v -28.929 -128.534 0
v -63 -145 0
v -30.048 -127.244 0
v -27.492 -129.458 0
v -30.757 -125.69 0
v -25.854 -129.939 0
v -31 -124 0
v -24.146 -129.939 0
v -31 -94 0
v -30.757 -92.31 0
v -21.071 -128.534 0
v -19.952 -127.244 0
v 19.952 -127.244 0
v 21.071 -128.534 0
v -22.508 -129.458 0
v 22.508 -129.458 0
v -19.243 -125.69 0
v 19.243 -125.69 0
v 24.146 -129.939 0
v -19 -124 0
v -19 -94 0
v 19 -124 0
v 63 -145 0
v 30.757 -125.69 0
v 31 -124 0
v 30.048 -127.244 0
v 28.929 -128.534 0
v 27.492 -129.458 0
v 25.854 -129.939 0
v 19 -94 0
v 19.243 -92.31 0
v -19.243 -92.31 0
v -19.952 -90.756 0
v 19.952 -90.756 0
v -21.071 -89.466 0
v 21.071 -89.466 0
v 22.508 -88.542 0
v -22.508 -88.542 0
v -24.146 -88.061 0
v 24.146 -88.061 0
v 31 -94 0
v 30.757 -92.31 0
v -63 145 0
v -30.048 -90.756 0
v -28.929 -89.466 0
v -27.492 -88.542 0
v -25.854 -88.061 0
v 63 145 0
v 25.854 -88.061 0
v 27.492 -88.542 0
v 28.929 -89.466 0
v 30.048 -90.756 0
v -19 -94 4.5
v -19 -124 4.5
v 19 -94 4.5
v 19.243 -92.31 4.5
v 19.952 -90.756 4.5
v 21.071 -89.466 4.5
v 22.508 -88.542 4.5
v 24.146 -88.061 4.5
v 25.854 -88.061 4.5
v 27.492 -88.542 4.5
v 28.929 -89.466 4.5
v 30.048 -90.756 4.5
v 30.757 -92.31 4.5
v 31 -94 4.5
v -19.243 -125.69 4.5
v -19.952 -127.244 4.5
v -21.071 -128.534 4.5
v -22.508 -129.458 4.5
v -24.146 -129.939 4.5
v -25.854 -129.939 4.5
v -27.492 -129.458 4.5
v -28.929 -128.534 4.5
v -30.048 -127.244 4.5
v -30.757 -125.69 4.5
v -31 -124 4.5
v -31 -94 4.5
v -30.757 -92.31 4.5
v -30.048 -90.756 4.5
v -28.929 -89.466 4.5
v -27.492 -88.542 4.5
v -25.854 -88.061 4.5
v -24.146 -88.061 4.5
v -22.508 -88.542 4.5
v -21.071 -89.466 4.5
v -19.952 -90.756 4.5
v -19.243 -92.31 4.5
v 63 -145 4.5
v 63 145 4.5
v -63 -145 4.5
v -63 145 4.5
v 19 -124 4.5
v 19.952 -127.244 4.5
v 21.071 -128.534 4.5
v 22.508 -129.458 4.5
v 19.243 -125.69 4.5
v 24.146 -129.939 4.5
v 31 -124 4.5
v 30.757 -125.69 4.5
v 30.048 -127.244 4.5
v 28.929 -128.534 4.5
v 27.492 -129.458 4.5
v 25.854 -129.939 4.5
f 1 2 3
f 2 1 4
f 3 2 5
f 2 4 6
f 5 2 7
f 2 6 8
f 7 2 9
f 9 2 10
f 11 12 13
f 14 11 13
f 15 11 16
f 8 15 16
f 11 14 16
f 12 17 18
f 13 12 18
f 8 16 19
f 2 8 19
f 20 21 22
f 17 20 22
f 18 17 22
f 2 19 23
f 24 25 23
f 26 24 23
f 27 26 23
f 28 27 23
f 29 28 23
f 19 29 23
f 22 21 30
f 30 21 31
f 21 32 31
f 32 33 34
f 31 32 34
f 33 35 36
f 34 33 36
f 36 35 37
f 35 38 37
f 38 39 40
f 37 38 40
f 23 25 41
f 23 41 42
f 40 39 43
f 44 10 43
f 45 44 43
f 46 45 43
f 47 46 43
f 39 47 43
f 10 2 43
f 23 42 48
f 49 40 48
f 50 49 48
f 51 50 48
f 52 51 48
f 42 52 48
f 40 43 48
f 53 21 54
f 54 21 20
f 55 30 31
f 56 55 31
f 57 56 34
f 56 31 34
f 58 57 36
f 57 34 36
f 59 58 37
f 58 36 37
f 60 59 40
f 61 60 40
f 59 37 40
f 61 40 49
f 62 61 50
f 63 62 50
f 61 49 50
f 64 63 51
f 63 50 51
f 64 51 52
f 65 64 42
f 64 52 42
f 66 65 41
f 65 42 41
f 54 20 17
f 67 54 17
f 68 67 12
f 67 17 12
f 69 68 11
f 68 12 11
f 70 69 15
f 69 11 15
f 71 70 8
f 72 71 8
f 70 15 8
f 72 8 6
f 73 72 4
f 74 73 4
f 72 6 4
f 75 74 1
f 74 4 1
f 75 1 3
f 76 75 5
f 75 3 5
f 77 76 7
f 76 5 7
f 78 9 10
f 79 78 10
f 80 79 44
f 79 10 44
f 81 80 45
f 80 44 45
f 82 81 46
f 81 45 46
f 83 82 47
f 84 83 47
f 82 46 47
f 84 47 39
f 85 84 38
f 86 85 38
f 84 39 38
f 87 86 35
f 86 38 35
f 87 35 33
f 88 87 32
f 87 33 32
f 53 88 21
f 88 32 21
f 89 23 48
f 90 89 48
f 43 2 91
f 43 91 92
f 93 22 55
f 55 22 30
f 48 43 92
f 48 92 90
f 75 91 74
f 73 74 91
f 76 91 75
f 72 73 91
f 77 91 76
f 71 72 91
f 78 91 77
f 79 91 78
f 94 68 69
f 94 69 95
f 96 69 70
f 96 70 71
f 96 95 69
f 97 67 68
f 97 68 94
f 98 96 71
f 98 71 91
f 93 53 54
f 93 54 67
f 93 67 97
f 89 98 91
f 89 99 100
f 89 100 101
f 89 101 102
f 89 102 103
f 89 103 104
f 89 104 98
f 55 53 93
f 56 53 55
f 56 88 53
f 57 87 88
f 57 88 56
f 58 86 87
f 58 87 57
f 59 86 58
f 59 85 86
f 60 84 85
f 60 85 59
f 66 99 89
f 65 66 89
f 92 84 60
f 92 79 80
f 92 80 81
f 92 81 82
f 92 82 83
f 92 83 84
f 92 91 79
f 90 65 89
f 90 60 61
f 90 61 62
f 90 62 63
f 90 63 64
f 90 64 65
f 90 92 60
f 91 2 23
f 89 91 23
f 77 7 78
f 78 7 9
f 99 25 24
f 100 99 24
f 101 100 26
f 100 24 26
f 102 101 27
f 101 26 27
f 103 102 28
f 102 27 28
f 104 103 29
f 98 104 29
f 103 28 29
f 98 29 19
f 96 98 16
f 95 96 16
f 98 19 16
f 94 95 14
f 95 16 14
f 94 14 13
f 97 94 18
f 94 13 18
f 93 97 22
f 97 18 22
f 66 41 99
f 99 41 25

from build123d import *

# Parameters (mm, degrees)
SKETCH1_W           = 126
SKETCH1_H           = 290
BOSS_EXTRUDE2_DEPTH = 4.5


with BuildPart() as part:
    # Sketch1 → Boss-Extrude2 (new body)
    with BuildSketch(Plane.XY):
        Rectangle(SKETCH1_W, SKETCH1_H)
        with BuildLine():
            Line((-19, -109), (-19, -124))
            ThreePointArc((-19, -124), (-25, -130), (-31, -124))
            Line((-31, -124), (-31, -94))
            ThreePointArc((-31, -94), (-25, -88), (-19, -94))
            Line((-19, -94), (-19, -109))
        make_face(mode=Mode.SUBTRACT)
        with BuildLine():
            ThreePointArc((31, -124), (25, -130), (19, -124))
            Line((19, -124), (19, -94))
            ThreePointArc((19, -94), (25, -88), (31, -94))
            Line((31, -94), (31, -124))
        make_face(mode=Mode.SUBTRACT)
    extrude(amount=BOSS_EXTRUDE2_DEPTH)


solid = part.part
